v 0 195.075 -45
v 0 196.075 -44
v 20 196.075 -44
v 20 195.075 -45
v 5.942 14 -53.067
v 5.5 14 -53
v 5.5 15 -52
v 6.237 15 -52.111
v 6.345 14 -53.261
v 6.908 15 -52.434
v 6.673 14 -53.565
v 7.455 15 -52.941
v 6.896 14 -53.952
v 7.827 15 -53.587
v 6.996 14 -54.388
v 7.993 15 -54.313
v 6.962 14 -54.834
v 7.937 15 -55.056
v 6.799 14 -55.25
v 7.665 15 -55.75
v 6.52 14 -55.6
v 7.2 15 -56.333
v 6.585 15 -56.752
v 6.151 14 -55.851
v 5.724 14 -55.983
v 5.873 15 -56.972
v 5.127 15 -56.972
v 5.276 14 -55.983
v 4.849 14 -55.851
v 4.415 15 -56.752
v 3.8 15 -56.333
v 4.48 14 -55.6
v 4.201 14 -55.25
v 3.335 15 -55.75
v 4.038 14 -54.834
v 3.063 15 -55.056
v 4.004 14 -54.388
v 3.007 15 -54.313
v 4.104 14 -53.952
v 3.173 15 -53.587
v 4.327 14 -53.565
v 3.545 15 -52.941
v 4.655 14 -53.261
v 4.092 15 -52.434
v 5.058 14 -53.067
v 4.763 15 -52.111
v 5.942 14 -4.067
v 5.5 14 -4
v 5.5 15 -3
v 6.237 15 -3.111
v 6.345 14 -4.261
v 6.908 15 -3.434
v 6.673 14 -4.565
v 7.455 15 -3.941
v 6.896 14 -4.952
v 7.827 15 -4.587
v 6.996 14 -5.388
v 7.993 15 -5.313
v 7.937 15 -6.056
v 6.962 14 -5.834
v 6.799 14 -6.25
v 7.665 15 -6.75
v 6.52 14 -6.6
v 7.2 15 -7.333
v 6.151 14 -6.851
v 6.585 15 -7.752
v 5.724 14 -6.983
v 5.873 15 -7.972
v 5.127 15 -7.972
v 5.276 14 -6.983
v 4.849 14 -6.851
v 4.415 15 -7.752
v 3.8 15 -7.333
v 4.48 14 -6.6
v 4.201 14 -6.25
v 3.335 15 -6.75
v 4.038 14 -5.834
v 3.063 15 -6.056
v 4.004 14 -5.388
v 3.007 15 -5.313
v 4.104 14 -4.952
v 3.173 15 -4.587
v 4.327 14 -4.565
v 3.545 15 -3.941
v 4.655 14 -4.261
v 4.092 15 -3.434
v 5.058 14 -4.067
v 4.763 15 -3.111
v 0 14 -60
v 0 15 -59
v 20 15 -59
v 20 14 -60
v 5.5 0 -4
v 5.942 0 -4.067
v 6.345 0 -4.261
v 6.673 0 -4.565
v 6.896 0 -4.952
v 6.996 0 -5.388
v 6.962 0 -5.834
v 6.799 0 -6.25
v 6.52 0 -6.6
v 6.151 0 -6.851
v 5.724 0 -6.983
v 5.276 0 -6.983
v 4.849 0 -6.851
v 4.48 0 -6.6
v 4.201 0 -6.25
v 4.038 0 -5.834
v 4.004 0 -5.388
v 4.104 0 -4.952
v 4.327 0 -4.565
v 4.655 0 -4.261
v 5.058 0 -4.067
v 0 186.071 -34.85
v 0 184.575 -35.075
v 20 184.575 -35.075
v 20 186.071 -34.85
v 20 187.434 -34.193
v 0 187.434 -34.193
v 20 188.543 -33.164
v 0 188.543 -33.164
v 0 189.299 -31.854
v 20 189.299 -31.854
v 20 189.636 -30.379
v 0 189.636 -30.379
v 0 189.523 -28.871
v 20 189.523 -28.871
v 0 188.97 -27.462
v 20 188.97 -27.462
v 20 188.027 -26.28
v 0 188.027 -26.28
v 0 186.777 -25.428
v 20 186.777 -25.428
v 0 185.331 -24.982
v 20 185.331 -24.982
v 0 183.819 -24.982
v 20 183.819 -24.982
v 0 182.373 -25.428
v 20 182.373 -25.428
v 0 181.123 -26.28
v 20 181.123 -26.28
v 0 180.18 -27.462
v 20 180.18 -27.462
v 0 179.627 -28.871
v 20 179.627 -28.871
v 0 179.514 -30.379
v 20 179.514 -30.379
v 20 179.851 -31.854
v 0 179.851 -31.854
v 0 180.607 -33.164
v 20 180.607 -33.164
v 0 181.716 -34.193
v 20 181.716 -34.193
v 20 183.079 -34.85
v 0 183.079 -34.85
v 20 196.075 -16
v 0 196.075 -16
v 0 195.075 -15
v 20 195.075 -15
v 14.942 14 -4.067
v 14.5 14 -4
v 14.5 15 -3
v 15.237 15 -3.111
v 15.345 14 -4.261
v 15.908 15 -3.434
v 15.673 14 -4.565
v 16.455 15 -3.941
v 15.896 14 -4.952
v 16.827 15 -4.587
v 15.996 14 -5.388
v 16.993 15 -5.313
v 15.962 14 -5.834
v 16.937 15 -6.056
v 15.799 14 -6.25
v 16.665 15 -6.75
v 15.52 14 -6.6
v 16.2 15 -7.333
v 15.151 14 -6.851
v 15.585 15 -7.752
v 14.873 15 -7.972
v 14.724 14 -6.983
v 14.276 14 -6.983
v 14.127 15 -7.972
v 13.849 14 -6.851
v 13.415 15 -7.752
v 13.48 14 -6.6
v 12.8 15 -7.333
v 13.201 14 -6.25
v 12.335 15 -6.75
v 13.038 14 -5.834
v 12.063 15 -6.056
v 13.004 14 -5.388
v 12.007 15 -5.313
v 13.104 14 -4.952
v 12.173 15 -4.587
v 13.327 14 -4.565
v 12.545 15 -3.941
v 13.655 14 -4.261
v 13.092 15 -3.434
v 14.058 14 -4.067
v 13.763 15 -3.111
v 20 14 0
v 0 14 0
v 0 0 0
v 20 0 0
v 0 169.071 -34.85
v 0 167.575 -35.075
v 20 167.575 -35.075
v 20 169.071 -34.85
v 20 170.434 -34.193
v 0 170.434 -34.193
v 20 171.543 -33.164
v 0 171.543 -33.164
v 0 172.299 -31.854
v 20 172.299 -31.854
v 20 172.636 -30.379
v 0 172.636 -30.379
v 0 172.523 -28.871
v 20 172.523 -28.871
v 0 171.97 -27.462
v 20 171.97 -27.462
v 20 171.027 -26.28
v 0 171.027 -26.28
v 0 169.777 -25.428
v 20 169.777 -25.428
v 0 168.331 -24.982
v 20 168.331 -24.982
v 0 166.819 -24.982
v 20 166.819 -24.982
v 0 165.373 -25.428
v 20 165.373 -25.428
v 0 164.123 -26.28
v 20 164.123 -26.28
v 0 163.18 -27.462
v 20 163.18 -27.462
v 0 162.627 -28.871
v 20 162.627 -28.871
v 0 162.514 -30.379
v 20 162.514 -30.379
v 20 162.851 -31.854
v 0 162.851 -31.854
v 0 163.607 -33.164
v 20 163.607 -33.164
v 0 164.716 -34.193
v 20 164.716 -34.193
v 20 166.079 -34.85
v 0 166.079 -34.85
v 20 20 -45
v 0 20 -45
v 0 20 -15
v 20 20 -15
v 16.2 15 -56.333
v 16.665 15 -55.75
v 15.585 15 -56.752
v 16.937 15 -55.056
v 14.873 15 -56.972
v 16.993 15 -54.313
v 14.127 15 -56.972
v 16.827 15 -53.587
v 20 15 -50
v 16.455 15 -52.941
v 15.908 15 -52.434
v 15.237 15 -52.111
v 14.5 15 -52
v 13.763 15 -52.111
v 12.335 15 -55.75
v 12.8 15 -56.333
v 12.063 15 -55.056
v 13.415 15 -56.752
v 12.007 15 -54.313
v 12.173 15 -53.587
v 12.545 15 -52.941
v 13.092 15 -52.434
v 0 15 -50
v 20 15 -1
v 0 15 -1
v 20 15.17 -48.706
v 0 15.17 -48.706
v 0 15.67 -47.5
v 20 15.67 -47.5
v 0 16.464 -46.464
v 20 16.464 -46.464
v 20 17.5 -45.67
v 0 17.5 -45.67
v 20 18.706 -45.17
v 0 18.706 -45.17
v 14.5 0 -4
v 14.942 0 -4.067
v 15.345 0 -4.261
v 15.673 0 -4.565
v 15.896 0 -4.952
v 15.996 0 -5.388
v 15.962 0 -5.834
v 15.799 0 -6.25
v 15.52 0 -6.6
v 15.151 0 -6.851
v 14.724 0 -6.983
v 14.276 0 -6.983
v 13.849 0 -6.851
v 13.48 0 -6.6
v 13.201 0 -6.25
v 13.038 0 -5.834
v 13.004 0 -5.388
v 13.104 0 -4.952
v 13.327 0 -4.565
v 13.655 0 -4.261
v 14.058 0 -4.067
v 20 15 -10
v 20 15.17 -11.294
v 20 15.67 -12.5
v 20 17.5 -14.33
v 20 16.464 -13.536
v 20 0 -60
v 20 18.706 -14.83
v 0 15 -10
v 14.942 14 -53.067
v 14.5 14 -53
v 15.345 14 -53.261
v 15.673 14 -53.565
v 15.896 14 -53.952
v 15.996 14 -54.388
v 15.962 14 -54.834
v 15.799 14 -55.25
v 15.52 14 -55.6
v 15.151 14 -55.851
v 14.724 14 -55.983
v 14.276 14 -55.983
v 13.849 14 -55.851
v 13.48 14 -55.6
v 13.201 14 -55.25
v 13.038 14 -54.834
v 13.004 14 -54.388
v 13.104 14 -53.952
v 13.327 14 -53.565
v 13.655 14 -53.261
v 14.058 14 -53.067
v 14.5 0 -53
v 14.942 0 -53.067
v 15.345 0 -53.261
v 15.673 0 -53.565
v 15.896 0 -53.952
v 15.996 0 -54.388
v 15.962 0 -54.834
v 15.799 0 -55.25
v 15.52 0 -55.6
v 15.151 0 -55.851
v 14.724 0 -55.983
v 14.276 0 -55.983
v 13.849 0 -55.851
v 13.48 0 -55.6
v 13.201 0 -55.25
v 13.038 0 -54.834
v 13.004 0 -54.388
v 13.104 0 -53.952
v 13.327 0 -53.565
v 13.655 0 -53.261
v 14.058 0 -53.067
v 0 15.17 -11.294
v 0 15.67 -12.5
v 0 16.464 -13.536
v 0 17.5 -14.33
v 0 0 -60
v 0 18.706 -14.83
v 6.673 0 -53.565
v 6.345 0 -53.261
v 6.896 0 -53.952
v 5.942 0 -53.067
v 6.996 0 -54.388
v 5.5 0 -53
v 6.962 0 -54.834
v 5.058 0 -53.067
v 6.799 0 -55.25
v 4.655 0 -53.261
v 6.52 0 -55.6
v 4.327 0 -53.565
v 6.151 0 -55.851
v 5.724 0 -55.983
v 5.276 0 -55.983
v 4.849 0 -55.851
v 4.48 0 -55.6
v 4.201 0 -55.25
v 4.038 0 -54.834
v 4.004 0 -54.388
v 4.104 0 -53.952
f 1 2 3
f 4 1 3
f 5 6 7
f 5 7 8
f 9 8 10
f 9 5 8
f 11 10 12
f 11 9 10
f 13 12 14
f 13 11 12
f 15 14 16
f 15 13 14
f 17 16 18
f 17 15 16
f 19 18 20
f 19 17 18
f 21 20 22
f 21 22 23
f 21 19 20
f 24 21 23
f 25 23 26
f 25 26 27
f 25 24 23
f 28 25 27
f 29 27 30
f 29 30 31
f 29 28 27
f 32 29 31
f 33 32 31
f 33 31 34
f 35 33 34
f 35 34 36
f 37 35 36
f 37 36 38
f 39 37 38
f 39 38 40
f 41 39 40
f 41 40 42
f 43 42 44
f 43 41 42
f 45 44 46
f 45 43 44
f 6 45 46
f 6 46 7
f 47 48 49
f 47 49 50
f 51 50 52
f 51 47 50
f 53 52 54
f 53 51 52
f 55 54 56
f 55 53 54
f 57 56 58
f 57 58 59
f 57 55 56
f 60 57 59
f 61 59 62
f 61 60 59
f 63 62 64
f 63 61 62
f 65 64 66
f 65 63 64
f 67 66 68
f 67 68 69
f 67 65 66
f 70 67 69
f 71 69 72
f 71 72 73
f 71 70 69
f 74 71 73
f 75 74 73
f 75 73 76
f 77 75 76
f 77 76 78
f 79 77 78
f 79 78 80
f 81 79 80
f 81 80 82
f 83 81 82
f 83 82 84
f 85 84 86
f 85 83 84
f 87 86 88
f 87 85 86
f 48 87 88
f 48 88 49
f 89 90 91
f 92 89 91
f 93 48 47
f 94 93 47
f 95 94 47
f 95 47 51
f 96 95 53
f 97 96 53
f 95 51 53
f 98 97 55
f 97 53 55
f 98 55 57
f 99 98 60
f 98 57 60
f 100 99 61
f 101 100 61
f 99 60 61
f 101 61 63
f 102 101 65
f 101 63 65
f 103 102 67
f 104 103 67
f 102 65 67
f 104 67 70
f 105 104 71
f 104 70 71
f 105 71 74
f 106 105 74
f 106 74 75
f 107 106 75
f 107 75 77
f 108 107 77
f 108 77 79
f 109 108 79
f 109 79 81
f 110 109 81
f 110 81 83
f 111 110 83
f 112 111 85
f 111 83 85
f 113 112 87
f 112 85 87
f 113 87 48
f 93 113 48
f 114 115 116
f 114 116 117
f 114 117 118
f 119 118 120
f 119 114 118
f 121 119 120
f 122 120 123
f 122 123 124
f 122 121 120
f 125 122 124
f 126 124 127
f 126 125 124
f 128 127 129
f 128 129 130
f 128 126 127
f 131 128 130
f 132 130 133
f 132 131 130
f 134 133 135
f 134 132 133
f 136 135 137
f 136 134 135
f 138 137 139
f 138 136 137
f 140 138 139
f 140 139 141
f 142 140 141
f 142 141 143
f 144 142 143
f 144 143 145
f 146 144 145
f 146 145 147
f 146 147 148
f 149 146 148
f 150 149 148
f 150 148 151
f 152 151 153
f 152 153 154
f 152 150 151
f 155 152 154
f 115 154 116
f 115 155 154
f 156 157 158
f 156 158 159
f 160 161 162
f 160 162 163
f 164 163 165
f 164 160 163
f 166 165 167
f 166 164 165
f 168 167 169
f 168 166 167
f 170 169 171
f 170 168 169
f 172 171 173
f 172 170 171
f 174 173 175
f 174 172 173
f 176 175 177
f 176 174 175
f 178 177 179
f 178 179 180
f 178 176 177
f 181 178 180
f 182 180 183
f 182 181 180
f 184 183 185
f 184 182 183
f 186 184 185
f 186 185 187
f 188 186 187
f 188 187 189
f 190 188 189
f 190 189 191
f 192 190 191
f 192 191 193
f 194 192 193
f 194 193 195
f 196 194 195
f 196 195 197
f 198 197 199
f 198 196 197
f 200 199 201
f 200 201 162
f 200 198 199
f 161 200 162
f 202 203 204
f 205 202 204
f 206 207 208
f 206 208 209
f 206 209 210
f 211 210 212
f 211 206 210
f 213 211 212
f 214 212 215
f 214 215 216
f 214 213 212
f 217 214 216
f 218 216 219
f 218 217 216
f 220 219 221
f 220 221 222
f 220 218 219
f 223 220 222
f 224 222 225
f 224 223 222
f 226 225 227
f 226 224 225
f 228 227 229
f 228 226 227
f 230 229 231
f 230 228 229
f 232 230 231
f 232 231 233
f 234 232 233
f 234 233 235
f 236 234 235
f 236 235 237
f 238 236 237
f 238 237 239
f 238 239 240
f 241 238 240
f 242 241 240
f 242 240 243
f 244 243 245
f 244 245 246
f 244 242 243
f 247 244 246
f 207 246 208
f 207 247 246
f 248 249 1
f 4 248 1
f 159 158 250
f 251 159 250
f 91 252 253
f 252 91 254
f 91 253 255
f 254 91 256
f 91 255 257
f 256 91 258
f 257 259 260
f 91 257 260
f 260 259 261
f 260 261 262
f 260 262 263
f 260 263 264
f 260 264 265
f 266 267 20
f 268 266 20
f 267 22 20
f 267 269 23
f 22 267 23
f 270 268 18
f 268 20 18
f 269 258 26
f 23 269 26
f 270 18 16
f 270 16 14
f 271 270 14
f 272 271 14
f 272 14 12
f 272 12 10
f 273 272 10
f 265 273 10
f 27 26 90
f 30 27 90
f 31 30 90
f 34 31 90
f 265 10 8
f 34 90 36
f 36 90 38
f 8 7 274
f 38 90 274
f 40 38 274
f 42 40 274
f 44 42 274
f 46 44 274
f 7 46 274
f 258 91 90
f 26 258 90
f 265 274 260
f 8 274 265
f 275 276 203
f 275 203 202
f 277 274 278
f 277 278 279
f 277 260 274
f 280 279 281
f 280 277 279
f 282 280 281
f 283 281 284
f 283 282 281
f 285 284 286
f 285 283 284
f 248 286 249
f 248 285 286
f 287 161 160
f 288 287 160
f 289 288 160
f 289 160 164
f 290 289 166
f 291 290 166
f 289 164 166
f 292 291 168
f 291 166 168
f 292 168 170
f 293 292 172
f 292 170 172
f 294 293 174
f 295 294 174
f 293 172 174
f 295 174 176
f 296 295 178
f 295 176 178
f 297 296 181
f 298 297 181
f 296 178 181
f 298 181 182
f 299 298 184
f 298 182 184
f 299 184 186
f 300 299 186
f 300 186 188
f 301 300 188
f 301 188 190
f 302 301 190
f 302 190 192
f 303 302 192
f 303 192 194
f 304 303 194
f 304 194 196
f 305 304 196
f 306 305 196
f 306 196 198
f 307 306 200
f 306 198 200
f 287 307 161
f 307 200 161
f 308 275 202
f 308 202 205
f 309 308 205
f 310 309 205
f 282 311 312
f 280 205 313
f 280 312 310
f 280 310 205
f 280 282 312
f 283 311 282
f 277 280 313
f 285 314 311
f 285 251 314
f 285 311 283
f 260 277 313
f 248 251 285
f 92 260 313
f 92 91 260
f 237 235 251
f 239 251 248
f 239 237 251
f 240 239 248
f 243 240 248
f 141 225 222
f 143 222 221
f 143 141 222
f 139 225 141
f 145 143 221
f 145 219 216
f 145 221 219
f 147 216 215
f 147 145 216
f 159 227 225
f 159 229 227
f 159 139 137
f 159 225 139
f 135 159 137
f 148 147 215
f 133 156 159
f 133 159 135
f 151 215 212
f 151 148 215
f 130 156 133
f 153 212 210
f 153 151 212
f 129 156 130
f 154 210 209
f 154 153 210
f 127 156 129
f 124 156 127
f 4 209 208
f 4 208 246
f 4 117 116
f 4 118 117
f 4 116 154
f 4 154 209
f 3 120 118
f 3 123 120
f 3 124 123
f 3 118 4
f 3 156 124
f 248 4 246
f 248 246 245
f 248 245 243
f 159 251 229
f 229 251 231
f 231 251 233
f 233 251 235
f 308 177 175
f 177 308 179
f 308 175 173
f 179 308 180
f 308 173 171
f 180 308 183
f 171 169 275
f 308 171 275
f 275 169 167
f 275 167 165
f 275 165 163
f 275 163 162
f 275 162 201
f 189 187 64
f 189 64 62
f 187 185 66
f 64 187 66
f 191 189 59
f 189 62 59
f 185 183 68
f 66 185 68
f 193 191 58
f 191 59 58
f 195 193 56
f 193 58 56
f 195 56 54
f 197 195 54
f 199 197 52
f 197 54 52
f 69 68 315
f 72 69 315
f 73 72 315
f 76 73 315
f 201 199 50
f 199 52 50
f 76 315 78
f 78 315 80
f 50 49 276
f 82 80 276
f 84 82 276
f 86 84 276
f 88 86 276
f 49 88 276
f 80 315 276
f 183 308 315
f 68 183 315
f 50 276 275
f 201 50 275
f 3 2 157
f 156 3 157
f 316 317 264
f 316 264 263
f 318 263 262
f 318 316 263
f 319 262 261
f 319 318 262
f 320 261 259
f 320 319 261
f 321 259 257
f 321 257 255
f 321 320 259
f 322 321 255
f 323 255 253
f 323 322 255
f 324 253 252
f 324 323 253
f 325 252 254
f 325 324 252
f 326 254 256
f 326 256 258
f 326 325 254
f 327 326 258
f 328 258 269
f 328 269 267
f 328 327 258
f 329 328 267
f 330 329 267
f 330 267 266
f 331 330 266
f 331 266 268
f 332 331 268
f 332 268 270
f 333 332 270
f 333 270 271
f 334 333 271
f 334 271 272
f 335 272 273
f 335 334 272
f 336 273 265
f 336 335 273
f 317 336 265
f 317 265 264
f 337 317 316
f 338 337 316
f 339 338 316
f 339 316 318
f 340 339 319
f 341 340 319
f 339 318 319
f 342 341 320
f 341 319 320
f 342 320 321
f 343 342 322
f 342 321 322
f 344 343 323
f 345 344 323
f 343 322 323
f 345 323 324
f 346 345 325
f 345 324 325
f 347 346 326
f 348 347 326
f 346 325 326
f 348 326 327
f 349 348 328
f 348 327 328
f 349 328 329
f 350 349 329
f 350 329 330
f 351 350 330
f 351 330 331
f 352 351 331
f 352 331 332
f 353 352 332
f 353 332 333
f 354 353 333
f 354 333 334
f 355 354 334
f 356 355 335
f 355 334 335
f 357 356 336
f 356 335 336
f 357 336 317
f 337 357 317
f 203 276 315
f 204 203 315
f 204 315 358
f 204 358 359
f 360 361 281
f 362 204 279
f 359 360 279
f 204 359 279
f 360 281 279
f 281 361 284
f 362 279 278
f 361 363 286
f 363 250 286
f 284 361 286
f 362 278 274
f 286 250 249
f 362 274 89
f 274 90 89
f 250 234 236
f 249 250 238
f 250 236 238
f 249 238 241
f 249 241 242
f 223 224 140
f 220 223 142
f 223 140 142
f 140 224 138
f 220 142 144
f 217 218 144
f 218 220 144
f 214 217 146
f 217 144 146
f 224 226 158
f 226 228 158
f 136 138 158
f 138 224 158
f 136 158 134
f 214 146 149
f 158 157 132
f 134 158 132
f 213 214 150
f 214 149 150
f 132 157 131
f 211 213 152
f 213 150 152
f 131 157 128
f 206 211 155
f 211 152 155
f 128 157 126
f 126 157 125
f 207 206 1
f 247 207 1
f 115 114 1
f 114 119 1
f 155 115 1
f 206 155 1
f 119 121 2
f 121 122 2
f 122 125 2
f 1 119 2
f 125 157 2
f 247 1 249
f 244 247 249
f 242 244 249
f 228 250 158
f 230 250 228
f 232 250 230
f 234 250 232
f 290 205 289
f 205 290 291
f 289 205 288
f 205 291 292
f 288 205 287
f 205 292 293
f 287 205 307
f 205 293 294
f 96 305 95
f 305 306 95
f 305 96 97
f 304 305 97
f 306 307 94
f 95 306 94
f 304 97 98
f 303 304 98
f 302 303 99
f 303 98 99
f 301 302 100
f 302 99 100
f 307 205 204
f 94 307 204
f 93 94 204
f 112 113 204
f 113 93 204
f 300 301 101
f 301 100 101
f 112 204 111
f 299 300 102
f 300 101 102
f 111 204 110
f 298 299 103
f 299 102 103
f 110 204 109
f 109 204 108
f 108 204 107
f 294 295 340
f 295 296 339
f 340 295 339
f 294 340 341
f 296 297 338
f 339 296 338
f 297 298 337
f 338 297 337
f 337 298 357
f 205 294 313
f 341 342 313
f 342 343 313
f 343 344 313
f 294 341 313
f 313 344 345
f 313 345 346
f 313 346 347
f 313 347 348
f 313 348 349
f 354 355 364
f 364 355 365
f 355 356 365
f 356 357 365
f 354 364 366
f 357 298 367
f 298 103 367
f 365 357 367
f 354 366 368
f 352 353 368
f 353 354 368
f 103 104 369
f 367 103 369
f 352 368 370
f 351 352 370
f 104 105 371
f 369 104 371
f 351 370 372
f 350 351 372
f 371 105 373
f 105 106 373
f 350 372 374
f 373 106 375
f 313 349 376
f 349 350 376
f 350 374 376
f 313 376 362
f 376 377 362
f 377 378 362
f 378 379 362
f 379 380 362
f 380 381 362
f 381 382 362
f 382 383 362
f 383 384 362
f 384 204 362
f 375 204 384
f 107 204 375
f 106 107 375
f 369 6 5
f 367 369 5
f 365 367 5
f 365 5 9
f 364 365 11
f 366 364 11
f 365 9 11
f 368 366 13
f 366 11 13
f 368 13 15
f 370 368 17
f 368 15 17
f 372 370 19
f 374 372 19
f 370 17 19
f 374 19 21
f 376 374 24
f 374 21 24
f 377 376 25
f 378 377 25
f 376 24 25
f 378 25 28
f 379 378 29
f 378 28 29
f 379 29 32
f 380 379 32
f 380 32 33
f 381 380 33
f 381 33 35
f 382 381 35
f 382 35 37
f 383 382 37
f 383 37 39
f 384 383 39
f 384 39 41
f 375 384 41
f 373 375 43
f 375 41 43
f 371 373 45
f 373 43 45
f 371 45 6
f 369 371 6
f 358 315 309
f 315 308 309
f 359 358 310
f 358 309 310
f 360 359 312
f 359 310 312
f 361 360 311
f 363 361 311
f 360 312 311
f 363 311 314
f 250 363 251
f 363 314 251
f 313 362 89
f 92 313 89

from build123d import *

# Parameters (mm, degrees)
SKETCH1_R           = 5.075
BOSS_EXTRUDE1_DEPTH = 20
CHAMFER1_SIZE       = 1
FILLET1_R           = 5
SKETCH2_R           = 1.5
CUT_EXTRUDE1_DEPTH  = 15
CHAMFER2_SIZE       = 1


with BuildPart() as part:
    # Sketch1 → Boss-Extrude1 (new body)
    with BuildSketch(Plane(origin=(0, 0, 0), x_dir=(0, 0, -1), z_dir=(1, 0, 0))):
        Polygon((0, 0), (60, 0), (60, 15), (45, 15), (45, 196.075), (15, 196.075), (15, 15), (0, 15), align=None)
        with Locations((30, 184.575)):
            Circle(SKETCH1_R, mode=Mode.SUBTRACT)
        with Locations((30, 167.575)):
            Circle(SKETCH1_R, mode=Mode.SUBTRACT)
    extrude(amount=BOSS_EXTRUDE1_DEPTH)

    # Chamfer1
    chamfer1_edges = [part.edges().sort_by_distance(p)[0] for p in [
        (10, 15, 0),
        (10, 196.075, -15),
        (10, 196.075, -45),
        (10, 15, -60),
    ]]
    chamfer(chamfer1_edges, length=CHAMFER1_SIZE)

    # Fillet1
    fillet1_edges = [part.edges().sort_by_distance(p)[0] for p in [
        (10, 15, -15),
        (10, 15, -45),
    ]]
    fillet(fillet1_edges, radius=FILLET1_R)

    # Sketch2 → Cut-Extrude1 (cut)
    with BuildSketch(Plane(origin=(0, 15, 0), x_dir=(1, 0, 0), z_dir=(0, 1, 0))):
        with Locations(Location((5.5, 54.5, 0), (0, 0, 270))):
            Circle(SKETCH2_R)
        with Locations(Location((14.5, 54.5, 0), (0, 0, 270))):
            Circle(SKETCH2_R)
        with Locations(Location((5.5, 5.5, 0), (0, 0, 270))):
            Circle(SKETCH2_R)
        with Locations(Location((14.5, 5.5, 0), (0, 0, 270))):
            Circle(SKETCH2_R)
    extrude(amount=-CUT_EXTRUDE1_DEPTH, mode=Mode.SUBTRACT)

    # Chamfer2
    chamfer2_edges = [part.edges().sort_by_distance(p)[0] for p in [
        (14.5, 15, -56),
        (5.5, 15, -7),
        (14.5, 15, -7),
        (5.5, 15, -56),
    ]]
    chamfer(chamfer2_edges, length=CHAMFER2_SIZE)


solid = part.part
